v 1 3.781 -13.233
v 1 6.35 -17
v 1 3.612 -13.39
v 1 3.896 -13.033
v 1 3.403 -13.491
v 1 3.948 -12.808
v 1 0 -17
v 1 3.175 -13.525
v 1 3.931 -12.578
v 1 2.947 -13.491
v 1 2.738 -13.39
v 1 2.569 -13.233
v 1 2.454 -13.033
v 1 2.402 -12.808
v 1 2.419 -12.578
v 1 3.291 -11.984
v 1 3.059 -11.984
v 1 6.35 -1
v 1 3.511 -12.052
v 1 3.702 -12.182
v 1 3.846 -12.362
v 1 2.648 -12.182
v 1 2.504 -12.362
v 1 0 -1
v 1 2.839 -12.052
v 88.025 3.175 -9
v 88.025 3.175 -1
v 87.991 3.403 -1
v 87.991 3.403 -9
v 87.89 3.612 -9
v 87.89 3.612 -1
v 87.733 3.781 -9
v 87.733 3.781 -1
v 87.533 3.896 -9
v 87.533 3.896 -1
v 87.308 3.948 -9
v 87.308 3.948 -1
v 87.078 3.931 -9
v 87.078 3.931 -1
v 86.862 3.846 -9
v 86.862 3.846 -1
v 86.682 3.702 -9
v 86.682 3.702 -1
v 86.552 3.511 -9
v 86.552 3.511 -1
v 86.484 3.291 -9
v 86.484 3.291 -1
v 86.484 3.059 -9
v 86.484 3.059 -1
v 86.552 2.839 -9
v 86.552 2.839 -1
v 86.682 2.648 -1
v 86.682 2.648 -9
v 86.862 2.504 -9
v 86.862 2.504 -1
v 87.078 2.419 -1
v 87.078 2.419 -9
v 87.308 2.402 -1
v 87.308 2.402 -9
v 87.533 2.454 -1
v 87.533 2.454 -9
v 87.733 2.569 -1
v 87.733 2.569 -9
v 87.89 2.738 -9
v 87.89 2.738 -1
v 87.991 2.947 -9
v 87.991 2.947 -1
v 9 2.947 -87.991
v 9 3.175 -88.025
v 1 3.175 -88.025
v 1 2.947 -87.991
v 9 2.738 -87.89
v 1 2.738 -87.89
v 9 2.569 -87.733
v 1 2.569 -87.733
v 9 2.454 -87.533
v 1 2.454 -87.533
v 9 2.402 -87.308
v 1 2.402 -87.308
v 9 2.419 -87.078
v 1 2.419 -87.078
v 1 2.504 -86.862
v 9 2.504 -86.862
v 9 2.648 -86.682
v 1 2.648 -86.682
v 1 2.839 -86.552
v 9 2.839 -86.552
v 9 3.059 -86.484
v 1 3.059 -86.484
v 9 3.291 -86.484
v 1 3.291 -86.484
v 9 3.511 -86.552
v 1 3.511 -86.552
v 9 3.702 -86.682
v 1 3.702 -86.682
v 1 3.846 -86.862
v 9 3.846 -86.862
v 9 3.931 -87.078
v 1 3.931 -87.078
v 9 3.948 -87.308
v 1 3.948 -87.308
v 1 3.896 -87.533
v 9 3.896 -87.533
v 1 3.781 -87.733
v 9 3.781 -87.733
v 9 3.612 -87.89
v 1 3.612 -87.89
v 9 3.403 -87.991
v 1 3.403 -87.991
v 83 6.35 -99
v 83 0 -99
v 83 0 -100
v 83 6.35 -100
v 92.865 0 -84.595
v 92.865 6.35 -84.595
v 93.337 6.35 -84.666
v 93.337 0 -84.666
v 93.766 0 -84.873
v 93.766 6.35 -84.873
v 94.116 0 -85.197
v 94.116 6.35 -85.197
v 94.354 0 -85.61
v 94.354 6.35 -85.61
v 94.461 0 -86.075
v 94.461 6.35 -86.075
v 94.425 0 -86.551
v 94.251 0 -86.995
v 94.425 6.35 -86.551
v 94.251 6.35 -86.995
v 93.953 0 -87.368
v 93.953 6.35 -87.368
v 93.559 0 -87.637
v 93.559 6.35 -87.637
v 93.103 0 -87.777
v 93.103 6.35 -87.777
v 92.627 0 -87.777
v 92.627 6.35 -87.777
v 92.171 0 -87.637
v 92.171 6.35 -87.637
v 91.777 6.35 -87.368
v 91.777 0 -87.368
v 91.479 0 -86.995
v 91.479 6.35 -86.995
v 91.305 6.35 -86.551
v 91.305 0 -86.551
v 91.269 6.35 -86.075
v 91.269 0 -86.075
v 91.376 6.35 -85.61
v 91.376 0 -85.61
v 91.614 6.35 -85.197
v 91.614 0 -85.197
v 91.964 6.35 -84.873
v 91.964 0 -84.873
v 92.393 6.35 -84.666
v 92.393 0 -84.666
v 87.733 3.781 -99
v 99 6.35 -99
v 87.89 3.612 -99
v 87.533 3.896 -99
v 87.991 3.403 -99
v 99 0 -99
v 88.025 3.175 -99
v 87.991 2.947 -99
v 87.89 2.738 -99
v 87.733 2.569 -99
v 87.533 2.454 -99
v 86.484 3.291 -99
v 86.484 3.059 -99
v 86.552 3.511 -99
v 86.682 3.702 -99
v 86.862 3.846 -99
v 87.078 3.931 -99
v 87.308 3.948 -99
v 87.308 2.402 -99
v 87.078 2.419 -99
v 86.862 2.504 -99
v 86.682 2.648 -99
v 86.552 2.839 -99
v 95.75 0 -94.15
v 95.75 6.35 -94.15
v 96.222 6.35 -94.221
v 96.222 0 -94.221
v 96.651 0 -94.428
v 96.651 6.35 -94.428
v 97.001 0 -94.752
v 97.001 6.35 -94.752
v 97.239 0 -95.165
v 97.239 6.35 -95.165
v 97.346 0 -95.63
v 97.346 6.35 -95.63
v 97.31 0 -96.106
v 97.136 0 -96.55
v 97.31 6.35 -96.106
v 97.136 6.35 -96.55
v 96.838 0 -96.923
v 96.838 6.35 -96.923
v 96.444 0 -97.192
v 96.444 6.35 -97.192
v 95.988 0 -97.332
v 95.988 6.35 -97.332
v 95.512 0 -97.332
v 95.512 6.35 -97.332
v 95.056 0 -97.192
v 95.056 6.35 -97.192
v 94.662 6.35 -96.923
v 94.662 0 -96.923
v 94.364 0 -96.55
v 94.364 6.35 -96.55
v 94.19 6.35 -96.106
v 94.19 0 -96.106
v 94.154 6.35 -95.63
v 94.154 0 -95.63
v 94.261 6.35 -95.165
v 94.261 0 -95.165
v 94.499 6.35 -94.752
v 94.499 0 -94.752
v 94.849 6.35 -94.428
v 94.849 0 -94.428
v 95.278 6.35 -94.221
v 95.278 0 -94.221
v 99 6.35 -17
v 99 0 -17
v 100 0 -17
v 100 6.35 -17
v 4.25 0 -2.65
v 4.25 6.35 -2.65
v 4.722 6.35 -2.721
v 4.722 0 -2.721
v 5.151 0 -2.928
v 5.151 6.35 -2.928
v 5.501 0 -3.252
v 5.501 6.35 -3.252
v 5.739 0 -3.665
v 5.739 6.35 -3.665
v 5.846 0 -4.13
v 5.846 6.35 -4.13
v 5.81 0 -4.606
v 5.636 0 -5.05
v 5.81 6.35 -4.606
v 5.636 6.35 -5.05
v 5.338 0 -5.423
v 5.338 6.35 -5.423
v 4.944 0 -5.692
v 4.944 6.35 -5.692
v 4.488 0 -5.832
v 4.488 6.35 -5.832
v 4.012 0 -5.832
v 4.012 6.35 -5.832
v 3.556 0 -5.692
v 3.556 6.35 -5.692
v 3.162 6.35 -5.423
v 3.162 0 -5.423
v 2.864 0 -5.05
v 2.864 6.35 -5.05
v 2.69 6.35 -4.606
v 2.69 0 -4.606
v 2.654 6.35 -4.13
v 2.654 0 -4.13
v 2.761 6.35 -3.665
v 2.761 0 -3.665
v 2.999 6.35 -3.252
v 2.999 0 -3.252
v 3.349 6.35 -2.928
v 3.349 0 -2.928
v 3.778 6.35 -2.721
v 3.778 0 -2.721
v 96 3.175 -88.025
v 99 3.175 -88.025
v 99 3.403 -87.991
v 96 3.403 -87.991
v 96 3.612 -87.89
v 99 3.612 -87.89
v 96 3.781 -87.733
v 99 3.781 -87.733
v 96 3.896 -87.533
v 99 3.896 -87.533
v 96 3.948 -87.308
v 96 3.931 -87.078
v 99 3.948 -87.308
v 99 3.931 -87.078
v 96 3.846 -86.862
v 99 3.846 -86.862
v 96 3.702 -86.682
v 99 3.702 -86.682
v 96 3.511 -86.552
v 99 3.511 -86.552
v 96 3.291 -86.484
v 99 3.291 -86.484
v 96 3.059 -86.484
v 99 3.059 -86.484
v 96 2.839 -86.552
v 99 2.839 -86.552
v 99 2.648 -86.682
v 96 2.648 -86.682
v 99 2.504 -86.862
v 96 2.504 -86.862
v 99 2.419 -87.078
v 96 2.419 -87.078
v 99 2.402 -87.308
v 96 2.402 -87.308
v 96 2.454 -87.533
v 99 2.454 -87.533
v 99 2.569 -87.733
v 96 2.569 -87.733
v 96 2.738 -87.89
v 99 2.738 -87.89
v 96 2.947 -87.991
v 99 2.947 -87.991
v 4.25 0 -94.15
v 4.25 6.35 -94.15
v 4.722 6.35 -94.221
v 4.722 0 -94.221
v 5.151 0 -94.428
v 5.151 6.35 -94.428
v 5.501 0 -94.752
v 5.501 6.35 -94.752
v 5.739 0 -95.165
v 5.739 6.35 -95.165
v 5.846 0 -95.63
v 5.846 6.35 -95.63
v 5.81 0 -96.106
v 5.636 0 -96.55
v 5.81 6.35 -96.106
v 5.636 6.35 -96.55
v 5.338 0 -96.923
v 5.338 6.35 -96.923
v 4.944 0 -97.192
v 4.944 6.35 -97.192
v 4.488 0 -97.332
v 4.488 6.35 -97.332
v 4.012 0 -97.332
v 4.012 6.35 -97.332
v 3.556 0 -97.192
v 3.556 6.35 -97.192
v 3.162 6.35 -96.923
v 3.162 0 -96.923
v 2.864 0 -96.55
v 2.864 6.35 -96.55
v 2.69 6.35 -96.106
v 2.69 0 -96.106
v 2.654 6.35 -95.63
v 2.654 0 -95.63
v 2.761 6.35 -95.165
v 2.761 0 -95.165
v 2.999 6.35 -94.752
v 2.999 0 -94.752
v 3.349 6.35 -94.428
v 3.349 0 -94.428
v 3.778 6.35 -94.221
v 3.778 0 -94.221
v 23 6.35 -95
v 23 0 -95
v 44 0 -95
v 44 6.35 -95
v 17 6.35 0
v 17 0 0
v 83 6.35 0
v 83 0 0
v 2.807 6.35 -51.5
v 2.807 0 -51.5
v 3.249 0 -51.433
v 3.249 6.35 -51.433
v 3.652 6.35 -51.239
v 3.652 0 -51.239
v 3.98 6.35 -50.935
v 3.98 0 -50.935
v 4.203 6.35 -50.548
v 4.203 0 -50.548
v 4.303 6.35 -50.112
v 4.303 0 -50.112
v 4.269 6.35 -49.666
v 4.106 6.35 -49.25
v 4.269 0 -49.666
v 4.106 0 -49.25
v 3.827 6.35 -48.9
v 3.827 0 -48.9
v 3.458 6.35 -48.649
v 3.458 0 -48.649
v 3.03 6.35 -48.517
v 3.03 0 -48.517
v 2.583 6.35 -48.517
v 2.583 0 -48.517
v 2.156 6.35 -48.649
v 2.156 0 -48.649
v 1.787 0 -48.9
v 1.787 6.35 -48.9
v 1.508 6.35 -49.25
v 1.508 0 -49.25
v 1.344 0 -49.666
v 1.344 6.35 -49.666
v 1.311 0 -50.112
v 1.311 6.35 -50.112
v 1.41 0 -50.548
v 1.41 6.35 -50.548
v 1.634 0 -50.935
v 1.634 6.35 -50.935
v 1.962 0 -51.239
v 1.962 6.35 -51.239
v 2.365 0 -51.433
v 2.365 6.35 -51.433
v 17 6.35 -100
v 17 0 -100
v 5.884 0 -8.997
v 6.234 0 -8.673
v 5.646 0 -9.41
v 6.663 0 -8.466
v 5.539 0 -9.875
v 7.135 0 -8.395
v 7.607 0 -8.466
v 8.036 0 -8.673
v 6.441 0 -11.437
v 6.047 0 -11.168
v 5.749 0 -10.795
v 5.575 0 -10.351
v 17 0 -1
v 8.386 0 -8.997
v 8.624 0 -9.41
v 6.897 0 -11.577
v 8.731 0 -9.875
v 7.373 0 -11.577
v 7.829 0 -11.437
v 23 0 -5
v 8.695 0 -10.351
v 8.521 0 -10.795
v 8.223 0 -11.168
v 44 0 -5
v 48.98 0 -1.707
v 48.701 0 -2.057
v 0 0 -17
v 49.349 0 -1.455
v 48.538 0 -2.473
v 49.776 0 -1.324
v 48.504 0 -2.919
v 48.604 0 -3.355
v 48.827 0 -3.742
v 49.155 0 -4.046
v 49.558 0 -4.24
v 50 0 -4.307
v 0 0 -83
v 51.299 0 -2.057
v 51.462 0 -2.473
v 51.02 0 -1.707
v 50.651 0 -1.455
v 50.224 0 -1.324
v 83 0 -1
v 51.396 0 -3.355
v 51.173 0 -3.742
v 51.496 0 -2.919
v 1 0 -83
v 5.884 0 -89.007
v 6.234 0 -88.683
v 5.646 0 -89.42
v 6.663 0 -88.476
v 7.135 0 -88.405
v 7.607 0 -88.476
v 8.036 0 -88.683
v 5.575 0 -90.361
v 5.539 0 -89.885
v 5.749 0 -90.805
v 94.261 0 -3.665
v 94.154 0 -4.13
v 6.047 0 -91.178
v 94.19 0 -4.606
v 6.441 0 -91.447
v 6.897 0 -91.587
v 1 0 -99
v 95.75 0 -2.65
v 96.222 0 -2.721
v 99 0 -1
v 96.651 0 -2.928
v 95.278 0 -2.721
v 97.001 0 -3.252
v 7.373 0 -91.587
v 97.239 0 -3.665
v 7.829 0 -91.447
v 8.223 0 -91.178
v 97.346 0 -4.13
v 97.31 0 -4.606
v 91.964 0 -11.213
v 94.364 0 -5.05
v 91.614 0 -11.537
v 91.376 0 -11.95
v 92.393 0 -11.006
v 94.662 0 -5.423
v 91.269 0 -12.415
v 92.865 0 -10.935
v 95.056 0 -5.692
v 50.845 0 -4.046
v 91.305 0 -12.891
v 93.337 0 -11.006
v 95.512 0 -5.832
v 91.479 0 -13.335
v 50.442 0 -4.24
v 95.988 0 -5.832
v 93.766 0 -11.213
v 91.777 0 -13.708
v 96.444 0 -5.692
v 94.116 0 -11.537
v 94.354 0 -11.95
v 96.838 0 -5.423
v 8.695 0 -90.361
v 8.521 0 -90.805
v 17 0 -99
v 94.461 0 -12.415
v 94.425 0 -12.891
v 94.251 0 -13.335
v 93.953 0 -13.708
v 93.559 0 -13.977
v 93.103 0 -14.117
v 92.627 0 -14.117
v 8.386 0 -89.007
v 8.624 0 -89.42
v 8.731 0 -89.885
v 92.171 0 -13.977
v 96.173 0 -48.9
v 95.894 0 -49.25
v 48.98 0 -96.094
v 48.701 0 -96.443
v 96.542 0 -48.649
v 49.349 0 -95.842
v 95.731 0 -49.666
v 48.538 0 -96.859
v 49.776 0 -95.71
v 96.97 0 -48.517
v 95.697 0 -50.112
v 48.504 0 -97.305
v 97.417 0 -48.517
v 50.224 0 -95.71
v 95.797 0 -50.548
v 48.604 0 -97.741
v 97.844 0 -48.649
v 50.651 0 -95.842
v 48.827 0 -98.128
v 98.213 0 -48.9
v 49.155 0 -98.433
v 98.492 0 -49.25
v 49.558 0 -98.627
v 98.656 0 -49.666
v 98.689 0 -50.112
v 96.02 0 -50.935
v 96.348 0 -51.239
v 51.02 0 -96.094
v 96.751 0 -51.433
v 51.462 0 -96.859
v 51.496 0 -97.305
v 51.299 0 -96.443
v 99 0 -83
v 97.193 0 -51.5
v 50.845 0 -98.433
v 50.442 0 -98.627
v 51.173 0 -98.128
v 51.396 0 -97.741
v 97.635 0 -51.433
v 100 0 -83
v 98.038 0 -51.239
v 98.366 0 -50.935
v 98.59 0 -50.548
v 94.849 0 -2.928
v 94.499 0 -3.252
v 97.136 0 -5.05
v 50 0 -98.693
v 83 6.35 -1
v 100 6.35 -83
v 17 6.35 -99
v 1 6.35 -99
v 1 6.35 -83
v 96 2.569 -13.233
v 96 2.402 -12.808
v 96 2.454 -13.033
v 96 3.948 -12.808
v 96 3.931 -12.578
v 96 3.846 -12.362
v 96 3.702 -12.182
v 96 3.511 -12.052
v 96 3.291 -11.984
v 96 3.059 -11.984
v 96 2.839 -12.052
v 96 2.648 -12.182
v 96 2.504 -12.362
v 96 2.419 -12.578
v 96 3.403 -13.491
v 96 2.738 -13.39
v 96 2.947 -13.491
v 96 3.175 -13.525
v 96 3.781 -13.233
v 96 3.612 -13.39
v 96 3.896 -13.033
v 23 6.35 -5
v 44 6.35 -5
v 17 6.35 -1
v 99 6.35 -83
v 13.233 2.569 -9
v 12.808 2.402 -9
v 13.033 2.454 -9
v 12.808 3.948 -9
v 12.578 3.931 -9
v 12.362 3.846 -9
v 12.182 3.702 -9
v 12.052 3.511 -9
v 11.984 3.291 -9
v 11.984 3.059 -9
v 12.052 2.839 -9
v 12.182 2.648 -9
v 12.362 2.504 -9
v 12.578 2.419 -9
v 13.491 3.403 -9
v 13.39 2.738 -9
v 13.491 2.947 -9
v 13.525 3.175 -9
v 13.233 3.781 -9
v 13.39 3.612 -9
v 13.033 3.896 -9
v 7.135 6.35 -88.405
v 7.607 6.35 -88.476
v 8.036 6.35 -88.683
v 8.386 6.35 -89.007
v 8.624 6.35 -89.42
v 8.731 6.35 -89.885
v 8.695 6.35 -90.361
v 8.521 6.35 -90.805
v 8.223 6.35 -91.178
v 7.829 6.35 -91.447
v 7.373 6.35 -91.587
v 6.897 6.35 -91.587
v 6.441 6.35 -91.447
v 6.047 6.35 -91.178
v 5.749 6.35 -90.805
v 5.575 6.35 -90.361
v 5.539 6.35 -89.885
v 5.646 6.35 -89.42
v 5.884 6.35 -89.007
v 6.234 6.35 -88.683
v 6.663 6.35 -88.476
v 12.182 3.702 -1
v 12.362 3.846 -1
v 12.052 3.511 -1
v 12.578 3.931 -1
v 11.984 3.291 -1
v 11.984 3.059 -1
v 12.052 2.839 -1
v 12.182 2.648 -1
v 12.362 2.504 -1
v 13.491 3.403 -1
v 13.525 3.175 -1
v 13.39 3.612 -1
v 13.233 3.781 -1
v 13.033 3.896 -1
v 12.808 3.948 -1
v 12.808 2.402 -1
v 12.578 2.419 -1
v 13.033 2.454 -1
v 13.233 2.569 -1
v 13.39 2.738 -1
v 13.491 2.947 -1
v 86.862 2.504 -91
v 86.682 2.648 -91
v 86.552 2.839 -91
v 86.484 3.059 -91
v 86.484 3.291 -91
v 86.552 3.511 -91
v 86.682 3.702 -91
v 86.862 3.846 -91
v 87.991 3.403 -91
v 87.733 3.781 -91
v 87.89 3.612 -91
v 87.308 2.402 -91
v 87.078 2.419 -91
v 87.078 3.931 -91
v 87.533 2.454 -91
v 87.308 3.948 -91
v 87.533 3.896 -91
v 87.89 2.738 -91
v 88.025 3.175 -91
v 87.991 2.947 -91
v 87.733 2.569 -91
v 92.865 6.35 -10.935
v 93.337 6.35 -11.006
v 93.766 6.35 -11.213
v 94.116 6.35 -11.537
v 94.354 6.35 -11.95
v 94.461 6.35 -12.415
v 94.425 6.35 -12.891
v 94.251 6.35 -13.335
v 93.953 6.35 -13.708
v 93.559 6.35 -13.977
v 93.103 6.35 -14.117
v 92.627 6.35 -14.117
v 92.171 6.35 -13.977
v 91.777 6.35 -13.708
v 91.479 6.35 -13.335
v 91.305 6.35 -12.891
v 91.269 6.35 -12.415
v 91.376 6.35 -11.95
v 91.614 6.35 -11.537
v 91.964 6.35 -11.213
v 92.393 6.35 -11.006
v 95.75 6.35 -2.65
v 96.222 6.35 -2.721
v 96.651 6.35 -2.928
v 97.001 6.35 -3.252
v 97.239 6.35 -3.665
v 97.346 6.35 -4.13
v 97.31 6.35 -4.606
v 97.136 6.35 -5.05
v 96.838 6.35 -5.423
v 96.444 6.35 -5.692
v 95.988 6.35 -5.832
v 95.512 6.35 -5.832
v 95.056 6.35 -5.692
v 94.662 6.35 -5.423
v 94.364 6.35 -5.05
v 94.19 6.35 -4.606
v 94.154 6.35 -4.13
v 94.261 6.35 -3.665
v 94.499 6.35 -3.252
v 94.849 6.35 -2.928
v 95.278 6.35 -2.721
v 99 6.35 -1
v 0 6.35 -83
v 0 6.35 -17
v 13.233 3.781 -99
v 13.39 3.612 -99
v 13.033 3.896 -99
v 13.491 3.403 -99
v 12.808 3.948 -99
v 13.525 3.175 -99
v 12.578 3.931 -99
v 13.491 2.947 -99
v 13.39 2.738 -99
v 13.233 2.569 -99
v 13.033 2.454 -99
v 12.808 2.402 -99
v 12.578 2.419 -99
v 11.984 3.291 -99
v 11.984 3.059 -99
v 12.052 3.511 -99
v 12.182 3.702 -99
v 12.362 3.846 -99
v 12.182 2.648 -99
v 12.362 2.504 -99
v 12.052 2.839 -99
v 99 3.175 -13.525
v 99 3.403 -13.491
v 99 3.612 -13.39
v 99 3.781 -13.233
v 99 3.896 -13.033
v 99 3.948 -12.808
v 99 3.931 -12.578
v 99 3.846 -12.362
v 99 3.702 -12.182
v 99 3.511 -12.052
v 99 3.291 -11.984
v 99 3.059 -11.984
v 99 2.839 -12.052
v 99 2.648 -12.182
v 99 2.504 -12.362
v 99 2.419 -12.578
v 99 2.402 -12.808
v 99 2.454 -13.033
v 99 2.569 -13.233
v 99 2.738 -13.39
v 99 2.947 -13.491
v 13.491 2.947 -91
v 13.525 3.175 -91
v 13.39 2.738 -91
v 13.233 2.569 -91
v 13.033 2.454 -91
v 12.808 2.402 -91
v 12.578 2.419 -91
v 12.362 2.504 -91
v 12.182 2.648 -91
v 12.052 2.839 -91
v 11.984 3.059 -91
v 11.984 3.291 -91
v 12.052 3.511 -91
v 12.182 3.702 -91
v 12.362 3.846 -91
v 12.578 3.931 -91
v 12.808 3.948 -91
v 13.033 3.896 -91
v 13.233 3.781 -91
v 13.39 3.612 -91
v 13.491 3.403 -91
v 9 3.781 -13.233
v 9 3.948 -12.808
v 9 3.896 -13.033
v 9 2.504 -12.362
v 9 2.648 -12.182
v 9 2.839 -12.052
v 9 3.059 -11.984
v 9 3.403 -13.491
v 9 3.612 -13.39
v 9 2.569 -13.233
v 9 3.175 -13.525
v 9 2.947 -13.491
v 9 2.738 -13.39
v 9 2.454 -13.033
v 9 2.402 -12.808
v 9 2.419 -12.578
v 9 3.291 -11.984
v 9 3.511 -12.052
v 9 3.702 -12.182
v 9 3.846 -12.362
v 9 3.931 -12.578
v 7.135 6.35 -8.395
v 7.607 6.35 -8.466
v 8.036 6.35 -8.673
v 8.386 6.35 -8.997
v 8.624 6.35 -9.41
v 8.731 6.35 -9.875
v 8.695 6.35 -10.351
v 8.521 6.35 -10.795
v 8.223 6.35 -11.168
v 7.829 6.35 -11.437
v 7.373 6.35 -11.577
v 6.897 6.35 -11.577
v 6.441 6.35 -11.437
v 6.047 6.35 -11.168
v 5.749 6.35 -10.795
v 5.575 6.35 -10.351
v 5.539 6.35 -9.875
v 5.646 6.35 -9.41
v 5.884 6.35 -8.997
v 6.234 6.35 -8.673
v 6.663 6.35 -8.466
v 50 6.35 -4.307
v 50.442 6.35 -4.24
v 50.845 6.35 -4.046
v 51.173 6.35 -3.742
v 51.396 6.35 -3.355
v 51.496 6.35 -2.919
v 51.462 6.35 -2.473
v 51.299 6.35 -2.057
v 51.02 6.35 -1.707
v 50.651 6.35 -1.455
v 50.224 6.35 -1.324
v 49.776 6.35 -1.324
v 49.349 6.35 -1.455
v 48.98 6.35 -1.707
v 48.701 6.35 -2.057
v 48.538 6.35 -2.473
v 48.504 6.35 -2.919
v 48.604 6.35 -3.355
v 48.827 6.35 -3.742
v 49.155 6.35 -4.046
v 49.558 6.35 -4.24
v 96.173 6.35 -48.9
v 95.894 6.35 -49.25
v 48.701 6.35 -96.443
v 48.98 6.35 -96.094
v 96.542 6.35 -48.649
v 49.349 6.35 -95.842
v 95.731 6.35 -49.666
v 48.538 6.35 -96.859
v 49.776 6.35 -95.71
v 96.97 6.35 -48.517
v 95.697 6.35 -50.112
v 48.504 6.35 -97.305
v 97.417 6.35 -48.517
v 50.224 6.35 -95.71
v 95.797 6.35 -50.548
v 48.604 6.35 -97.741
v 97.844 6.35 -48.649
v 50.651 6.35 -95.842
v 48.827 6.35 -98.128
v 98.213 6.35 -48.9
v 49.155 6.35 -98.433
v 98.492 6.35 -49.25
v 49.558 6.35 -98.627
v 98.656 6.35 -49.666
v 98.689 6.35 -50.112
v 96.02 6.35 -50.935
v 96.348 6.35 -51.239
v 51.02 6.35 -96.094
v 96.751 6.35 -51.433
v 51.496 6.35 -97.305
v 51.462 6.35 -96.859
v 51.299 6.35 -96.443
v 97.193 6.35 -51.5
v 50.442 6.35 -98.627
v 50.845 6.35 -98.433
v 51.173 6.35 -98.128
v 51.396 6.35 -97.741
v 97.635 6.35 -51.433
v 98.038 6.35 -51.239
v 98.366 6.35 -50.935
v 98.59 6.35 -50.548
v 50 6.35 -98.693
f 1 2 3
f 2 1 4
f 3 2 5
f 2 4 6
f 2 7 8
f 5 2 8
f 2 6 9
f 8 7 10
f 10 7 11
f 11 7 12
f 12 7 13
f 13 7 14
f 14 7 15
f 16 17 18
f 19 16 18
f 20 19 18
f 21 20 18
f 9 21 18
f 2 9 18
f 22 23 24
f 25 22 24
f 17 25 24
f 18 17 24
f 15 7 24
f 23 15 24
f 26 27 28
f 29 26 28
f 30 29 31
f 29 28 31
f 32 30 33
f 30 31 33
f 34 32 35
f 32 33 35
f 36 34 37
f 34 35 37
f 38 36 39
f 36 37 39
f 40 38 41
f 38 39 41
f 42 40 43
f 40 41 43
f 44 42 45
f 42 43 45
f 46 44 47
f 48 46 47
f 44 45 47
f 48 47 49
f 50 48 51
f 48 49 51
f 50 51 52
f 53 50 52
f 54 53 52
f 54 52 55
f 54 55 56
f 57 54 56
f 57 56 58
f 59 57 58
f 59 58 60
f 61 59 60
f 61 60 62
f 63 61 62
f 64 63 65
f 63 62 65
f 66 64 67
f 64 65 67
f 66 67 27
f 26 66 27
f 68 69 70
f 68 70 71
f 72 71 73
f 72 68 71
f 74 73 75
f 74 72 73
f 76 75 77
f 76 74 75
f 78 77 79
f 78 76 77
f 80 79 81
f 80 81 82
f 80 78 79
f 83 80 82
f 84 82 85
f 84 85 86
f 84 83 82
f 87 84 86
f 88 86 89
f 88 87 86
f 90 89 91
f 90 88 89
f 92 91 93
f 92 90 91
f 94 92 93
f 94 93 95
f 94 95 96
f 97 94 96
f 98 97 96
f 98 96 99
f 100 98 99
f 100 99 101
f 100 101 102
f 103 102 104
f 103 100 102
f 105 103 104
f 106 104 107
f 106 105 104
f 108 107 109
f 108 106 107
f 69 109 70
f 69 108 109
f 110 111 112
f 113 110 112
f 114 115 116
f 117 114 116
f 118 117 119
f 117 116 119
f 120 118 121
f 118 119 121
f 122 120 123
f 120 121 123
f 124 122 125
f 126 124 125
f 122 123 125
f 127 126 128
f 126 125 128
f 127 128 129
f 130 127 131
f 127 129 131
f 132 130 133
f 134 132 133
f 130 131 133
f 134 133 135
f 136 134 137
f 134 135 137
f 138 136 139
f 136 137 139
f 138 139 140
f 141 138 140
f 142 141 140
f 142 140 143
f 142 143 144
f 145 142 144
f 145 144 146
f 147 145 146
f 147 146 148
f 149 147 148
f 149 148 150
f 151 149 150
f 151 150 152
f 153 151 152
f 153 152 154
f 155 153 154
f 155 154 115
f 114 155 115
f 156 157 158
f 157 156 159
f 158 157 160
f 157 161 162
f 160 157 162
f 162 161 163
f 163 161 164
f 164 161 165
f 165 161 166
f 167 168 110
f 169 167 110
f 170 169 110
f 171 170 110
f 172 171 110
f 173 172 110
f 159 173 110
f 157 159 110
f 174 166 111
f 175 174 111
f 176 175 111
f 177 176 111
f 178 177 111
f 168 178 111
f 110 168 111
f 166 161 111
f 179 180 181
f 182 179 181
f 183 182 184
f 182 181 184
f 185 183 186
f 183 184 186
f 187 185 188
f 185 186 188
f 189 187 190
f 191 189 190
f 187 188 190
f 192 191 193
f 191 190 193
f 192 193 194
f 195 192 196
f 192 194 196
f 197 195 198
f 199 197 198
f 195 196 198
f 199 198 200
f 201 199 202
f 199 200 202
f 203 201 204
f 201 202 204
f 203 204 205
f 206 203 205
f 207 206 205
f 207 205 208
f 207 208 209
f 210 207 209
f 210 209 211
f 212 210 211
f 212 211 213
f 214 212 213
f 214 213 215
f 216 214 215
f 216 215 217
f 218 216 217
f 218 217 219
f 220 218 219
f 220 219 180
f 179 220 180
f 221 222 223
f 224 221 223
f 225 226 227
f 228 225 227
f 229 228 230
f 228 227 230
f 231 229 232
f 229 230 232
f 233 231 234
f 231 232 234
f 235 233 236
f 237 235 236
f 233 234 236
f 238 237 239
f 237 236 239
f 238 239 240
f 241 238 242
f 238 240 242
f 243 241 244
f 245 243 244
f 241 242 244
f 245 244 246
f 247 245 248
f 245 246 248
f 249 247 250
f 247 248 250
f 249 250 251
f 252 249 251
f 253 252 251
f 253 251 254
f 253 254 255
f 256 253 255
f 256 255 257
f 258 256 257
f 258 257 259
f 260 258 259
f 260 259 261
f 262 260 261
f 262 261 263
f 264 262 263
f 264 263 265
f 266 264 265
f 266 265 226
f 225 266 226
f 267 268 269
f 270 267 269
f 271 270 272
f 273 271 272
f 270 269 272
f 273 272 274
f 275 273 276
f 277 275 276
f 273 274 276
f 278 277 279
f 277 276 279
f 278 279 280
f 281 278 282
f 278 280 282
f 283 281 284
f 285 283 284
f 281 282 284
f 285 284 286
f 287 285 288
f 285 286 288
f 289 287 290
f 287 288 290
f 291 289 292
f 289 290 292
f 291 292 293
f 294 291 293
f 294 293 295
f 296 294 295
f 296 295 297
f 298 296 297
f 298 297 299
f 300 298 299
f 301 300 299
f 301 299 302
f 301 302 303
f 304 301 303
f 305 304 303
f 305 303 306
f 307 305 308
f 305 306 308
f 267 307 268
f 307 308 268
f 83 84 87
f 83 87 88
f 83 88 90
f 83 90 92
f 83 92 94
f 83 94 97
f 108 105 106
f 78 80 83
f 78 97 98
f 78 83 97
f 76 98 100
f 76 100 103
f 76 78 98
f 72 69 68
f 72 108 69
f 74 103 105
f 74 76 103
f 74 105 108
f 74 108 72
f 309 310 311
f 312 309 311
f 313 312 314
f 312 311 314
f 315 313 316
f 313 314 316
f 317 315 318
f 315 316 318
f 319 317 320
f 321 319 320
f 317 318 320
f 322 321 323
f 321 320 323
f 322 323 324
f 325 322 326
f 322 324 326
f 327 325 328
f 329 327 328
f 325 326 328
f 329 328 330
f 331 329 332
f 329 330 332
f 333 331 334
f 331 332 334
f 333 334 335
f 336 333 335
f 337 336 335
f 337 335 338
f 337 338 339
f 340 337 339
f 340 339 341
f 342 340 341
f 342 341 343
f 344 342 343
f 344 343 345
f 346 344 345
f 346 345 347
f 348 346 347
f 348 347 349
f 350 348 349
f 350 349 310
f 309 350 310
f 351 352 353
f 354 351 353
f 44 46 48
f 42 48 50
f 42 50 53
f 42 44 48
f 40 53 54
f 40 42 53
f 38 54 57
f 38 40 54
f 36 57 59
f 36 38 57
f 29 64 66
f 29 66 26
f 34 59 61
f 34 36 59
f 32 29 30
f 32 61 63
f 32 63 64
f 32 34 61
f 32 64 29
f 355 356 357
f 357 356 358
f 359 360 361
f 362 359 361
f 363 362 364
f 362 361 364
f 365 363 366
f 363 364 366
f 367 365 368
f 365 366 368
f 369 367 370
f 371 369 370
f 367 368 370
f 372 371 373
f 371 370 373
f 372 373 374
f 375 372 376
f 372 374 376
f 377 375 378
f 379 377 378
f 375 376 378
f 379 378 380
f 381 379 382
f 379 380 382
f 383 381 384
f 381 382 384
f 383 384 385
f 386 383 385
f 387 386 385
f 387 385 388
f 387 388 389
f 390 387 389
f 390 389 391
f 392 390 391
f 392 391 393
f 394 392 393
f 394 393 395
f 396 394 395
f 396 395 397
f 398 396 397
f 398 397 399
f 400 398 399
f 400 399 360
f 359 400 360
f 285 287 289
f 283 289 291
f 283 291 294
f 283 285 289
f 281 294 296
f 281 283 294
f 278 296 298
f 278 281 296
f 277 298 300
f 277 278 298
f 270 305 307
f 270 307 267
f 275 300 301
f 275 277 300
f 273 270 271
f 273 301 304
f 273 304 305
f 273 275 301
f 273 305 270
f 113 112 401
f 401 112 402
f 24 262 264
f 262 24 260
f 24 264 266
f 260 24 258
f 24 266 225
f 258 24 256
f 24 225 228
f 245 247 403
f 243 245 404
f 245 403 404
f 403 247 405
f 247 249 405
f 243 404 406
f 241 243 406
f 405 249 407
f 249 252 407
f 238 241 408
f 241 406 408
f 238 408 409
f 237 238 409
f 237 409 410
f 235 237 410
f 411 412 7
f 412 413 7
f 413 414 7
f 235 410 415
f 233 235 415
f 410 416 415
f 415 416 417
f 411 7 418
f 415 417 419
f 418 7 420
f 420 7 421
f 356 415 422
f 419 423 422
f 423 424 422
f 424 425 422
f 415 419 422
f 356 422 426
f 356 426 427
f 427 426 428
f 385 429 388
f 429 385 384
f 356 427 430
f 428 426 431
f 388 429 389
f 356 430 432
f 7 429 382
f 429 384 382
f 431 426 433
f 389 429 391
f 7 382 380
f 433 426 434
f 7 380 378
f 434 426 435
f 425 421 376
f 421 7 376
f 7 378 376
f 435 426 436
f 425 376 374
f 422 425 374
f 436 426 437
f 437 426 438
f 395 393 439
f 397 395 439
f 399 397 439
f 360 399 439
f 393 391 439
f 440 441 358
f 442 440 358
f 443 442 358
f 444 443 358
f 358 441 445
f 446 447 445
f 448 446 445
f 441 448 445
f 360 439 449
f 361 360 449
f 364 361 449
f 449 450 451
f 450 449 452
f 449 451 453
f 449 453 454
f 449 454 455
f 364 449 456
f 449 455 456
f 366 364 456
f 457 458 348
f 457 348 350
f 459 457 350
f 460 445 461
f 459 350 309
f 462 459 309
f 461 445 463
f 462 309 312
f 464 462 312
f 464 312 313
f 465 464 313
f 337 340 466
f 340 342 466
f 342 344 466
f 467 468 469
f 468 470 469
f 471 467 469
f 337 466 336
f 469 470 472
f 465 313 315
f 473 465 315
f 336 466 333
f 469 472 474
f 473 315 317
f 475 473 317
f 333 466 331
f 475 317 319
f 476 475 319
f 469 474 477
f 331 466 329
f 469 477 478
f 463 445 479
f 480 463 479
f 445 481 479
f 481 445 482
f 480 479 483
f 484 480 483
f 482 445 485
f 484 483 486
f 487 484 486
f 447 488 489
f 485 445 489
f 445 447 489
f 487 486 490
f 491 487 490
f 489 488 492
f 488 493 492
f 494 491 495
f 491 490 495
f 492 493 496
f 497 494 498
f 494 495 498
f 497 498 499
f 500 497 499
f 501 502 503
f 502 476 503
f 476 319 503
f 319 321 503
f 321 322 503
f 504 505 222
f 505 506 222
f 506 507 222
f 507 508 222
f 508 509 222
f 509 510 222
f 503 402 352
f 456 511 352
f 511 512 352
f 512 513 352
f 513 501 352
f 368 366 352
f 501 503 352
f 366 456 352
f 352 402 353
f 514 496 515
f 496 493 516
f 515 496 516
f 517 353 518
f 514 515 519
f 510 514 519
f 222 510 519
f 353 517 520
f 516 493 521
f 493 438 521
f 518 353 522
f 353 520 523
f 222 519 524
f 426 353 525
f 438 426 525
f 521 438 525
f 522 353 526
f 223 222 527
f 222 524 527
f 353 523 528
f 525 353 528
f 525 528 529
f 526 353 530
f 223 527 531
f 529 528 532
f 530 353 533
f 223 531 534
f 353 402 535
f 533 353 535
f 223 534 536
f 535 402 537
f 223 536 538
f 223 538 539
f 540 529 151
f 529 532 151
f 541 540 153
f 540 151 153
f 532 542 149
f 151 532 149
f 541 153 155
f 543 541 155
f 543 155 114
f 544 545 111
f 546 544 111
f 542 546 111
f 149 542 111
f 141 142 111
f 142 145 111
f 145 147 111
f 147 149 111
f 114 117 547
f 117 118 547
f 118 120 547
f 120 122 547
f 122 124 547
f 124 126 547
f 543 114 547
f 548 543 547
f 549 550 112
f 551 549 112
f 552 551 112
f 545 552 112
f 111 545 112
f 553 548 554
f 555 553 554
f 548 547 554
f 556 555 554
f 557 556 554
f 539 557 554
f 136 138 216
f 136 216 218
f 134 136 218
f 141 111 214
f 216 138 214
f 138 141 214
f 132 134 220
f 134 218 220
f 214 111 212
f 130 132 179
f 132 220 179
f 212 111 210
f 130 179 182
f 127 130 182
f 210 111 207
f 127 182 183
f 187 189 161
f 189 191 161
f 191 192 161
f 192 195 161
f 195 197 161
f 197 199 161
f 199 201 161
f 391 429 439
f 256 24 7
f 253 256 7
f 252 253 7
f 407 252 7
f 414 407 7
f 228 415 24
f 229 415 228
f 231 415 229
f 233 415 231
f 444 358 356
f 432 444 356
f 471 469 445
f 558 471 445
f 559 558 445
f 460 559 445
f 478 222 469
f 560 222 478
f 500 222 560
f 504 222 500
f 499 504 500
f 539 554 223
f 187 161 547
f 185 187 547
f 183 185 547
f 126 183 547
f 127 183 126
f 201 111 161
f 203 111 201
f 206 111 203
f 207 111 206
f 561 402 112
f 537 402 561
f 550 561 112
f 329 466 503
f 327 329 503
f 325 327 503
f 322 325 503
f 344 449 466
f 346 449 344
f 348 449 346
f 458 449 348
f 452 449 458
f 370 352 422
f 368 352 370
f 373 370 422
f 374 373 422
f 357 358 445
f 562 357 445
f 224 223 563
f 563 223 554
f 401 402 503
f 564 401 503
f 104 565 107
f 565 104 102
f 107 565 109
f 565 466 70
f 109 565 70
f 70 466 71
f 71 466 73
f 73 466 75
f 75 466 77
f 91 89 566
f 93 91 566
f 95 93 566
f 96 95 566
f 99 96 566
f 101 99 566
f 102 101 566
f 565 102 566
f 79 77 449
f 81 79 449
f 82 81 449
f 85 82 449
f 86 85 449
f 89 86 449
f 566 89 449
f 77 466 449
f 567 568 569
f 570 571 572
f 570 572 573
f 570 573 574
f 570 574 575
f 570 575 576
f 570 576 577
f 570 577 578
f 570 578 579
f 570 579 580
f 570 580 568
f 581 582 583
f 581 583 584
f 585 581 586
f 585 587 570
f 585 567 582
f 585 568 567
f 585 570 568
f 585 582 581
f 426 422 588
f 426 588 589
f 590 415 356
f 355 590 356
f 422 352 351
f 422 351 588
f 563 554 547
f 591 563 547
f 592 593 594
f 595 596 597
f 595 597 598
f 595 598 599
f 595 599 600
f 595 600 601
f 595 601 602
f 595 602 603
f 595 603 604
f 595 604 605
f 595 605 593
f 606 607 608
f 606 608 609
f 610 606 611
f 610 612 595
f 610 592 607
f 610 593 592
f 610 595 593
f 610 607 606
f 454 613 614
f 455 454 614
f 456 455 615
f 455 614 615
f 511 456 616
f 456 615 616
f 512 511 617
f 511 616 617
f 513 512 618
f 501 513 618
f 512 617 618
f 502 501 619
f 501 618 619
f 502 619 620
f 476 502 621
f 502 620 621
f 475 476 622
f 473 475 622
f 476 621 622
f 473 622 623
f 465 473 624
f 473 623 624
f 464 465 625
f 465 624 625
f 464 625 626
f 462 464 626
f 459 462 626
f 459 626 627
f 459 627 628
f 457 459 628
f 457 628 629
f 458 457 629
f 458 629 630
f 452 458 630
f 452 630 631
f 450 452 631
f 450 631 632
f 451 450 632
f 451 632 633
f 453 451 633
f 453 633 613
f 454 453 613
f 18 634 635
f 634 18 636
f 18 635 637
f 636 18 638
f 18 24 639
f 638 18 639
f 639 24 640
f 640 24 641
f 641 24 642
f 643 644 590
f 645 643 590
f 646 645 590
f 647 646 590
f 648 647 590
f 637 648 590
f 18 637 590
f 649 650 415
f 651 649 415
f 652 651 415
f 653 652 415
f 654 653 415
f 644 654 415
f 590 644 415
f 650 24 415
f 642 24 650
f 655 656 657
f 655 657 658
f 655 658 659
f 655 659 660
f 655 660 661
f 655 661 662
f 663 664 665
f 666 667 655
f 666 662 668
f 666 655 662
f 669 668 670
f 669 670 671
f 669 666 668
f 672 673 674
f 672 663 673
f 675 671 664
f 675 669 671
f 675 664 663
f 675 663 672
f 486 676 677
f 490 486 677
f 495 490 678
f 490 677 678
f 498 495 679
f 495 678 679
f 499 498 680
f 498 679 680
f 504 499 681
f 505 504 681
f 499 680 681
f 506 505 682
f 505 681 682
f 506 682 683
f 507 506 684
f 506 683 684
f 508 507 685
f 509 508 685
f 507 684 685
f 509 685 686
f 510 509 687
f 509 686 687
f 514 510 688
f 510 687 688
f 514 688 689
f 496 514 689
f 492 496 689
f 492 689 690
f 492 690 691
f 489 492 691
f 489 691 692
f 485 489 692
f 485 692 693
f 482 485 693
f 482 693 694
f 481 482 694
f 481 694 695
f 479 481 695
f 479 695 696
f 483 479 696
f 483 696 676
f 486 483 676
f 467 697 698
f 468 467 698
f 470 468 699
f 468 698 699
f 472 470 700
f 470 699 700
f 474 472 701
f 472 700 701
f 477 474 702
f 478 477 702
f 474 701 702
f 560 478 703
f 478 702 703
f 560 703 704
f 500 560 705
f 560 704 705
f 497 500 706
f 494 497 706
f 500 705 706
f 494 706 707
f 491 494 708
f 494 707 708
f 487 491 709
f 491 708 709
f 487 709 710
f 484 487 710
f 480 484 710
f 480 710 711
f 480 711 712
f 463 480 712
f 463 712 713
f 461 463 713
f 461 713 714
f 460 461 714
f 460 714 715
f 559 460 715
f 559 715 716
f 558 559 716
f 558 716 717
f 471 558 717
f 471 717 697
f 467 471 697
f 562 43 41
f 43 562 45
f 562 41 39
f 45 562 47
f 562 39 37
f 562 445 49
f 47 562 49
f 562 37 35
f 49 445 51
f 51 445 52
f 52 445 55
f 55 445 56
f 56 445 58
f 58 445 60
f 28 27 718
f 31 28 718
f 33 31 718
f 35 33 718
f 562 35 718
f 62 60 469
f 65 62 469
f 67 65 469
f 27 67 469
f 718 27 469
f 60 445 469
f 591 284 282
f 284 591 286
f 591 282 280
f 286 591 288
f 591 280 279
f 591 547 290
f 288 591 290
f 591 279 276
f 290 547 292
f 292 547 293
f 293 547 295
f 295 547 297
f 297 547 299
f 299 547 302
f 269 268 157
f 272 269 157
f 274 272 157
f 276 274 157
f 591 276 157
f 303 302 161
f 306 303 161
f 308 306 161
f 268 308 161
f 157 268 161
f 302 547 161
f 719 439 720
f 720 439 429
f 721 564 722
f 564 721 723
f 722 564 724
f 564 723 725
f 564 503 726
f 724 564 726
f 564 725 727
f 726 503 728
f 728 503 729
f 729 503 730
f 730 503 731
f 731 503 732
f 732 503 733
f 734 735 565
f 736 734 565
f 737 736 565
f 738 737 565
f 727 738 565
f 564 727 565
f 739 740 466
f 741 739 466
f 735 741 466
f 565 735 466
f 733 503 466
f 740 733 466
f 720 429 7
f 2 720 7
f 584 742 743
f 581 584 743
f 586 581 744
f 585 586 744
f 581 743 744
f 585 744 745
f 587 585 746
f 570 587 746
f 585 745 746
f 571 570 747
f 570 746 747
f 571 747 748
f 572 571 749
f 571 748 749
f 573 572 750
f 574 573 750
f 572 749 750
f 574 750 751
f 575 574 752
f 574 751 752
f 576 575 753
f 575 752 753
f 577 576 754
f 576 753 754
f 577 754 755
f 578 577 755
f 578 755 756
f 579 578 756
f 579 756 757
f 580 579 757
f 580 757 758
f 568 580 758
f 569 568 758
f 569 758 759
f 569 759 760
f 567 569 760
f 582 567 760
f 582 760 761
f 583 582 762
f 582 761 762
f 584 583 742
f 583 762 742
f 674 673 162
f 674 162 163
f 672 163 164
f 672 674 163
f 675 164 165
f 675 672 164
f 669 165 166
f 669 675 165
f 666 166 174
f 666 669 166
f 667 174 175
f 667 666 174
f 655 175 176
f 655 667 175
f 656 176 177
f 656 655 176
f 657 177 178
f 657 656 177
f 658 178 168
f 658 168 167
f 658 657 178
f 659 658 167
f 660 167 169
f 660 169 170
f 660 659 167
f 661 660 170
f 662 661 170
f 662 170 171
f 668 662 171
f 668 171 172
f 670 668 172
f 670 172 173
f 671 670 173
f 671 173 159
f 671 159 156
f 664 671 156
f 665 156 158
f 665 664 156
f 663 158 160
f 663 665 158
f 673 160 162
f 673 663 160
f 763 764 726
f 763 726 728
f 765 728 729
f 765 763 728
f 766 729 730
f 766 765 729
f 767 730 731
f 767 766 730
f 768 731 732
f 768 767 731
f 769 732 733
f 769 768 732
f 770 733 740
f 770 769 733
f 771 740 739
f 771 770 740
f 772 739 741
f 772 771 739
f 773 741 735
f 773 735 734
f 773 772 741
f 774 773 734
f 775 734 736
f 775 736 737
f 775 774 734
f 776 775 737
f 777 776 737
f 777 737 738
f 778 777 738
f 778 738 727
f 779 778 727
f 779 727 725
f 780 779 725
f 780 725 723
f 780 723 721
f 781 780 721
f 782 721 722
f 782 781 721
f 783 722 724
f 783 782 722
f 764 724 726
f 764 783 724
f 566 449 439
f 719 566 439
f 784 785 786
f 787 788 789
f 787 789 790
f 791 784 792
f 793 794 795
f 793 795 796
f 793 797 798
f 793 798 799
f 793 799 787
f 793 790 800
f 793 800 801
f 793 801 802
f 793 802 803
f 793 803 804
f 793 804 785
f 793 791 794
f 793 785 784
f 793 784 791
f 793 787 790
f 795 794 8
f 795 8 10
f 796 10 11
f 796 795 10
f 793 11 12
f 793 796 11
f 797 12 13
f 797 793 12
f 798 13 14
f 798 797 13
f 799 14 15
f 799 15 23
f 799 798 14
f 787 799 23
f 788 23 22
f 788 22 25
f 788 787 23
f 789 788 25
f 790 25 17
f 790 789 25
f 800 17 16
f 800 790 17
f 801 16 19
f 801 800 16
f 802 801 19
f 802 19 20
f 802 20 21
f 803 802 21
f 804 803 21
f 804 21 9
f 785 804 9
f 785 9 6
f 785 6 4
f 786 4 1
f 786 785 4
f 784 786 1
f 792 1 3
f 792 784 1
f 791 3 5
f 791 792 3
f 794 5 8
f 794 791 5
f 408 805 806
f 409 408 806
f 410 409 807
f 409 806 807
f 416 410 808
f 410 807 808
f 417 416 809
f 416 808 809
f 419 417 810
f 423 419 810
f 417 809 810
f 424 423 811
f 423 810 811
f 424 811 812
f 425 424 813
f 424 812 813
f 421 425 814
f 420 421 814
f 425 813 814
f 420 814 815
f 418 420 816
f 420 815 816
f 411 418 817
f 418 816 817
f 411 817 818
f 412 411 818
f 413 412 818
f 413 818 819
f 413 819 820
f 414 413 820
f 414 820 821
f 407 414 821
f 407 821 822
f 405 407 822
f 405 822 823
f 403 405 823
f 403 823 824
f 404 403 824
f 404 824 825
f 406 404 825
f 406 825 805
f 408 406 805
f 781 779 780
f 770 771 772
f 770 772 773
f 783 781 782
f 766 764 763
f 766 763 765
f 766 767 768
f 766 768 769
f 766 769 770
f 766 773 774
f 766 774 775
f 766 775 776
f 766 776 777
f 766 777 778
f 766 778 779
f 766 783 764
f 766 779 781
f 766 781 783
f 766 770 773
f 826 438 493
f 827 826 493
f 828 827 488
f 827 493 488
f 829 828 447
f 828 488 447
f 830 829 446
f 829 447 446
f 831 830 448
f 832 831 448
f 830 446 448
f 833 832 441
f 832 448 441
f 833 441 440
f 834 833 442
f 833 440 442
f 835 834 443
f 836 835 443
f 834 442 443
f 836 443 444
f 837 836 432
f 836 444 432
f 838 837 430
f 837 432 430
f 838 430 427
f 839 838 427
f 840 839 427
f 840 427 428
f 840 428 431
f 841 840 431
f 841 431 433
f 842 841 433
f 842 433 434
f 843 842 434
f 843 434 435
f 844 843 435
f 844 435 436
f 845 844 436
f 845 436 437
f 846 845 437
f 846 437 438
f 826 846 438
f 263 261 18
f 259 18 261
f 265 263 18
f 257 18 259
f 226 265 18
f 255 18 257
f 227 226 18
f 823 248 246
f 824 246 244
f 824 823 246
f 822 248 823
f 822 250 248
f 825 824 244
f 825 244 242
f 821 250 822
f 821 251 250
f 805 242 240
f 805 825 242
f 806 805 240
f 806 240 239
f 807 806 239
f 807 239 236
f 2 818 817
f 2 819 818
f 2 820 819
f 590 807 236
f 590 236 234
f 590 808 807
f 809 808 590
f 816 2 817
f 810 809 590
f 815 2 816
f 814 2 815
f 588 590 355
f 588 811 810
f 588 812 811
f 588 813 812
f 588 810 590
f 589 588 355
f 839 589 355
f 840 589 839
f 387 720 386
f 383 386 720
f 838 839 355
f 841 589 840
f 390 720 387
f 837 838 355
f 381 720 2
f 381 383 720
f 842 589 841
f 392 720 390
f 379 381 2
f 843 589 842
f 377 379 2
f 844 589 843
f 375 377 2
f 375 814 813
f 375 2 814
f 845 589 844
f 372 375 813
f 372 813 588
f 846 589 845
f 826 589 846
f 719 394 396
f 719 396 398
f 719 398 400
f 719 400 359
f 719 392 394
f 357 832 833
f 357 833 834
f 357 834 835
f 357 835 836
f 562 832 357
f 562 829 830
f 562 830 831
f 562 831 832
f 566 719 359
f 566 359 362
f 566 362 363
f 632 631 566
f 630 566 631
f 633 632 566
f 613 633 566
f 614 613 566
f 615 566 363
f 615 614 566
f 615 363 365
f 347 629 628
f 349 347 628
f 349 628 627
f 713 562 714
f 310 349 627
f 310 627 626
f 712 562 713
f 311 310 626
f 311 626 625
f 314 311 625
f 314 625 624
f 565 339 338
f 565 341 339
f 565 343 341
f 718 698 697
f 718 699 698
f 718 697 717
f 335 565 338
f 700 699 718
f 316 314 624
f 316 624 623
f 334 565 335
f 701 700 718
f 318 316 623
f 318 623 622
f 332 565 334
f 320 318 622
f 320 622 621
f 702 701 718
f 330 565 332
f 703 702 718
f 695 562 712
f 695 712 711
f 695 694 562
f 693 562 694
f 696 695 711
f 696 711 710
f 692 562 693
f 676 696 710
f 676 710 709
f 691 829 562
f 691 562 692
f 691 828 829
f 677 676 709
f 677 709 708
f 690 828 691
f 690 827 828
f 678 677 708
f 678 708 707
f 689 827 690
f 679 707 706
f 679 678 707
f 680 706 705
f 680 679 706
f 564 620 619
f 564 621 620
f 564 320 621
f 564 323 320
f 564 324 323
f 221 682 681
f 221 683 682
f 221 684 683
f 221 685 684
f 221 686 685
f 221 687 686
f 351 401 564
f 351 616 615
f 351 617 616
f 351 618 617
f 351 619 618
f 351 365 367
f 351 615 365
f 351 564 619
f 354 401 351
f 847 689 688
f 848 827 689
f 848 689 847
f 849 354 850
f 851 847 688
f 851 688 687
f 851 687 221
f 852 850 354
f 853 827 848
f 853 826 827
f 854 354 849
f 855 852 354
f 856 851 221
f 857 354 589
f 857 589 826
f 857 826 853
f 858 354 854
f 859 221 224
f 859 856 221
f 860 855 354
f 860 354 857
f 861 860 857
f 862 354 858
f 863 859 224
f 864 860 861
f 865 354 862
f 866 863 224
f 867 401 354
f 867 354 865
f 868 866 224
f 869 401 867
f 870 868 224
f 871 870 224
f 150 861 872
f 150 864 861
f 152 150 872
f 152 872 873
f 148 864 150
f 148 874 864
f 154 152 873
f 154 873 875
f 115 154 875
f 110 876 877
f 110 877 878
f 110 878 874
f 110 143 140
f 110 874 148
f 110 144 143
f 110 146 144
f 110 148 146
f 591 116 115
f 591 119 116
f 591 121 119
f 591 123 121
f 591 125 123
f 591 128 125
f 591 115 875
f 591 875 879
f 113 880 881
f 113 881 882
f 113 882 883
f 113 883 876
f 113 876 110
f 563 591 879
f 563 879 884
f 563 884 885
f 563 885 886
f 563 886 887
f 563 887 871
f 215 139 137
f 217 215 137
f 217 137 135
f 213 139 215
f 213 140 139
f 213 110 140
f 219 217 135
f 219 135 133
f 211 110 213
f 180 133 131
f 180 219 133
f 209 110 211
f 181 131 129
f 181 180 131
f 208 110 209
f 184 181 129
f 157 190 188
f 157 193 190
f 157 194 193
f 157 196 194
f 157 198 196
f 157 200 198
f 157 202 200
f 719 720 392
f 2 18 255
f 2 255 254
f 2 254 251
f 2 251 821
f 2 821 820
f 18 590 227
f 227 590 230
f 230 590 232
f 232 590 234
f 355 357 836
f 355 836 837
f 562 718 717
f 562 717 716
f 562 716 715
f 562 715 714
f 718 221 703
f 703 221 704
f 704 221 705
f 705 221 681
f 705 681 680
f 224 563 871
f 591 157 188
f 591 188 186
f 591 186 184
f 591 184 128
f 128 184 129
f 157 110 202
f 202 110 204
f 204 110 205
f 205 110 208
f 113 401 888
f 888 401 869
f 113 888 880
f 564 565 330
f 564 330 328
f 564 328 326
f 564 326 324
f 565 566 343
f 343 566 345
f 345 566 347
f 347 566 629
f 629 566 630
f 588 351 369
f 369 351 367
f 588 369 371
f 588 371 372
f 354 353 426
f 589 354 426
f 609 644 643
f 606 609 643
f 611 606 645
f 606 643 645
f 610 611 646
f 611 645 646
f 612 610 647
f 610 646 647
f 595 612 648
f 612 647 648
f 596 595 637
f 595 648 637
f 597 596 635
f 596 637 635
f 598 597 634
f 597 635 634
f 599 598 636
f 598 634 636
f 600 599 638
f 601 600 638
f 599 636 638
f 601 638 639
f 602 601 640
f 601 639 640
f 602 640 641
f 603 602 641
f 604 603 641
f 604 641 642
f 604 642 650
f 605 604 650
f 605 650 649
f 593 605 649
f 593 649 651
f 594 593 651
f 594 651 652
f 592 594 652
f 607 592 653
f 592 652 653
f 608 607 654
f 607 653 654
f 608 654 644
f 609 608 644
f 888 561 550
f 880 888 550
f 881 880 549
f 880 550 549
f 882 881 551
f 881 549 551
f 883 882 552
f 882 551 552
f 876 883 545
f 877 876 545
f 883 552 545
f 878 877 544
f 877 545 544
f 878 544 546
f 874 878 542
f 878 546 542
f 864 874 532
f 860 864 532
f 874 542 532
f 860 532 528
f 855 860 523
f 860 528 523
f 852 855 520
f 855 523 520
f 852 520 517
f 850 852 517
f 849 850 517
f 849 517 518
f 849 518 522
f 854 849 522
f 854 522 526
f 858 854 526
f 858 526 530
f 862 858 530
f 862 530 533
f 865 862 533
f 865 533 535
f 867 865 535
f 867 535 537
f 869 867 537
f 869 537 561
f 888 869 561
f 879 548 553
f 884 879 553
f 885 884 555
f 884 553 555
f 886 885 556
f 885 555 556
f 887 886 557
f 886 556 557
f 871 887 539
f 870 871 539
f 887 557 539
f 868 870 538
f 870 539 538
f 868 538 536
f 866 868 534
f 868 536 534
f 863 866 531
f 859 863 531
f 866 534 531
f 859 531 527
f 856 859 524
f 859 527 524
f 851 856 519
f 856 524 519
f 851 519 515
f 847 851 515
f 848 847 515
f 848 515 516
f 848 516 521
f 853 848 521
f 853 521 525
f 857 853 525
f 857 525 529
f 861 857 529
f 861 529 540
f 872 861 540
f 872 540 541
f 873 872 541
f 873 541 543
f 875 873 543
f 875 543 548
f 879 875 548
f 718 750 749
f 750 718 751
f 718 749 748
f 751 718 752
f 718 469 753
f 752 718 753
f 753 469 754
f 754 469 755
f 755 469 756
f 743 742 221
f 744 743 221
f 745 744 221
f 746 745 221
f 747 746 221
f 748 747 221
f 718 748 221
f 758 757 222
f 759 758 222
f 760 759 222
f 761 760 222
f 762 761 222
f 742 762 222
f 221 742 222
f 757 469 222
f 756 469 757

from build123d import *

# Parameters (mm, degrees)
BOSS_EXTRUDE1_DEPTH = 6.35
SKETCH4_R           = 1.2
CUT_EXTRUDE3_DEPTH  = 2540
SKETCH129_R         = 0.775
CUT_EXTRUDE5_DEPTH  = 3
SKETCH130_R         = 0.775
CUT_EXTRUDE6_DEPTH  = 8
CUT_EXTRUDE7_START  = -8
SKETCH131_R         = 0.775
CUT_EXTRUDE7_DEPTH  = 8
CUT_EXTRUDE8_START  = -8
SKETCH132_R         = 0.775
CUT_EXTRUDE8_DEPTH  = 8
SKETCH133_R         = 1.6
CUT_EXTRUDE9_DEPTH  = 10
SKETCH134_R         = 1.6
CUT_EXTRUDE10_DEPTH = 10
SKETCH135_R         = 1.5
CUT_EXTRUDE11_DEPTH = 142.56384602
SKETCH136_W         = 21
SKETCH136_H         = 90
CUT_EXTRUDE12_DEPTH = 142.56384602


with BuildPart() as part:
    # Sketch1 → Boss-Extrude1 (new body)
    with BuildSketch(Plane(origin=(0, 0, 0), x_dir=(1, 0, 0), z_dir=(0, 1, 0))):
        Polygon((1, 83), (0, 83), (0, 17), (1, 17), (1, 1), (17, 1), (17, 0), (83, 0), (83, 1), (99, 1), (99, 17), (100, 17), (100, 83), (99, 83), (99, 99), (83, 99), (83, 100), (17, 100), (17, 99), (1, 99), align=None)
    extrude(amount=BOSS_EXTRUDE1_DEPTH)

    # Sketch4 → Cut-Extrude3 (cut, symmetric)
    with BuildSketch(Plane(origin=(-170.766523355, -217.05420542, -269.308617799), x_dir=(0, 0, -1), z_dir=(0, -1, 0))):
        with Locations((-179.303617798, 177.901523357)):
            Circle(SKETCH4_R)
        with Locations((-259.313617798, 177.901523357)):
            Circle(SKETCH4_R)
        with Locations((-256.773617797, 263.631523357)):
            Circle(SKETCH4_R)
        with Locations((-183.113617797, 263.631523357)):
            Circle(SKETCH4_R)
    extrude(amount=CUT_EXTRUDE3_DEPTH, both=True, mode=Mode.SUBTRACT)

    # Sketch129 → Cut-Extrude5 (cut)
    with BuildSketch(Plane(origin=(99, 0, 0), x_dir=(0, 0, -1), z_dir=(1, 0, 0))):
        with Locations((12.75, 3.175)):
            Circle(SKETCH129_R)
        with Locations((87.25, 3.175)):
            Circle(SKETCH129_R)
    extrude(amount=-CUT_EXTRUDE5_DEPTH, mode=Mode.SUBTRACT)

    # Sketch130 → Cut-Extrude6 (cut)
    with BuildSketch(Plane.XY.offset(-1)):
        with Locations((87.25, 3.175)):
            Circle(SKETCH130_R)
        with Locations((12.75, 3.175)):
            Circle(SKETCH130_R)
    extrude(amount=-CUT_EXTRUDE6_DEPTH, mode=Mode.SUBTRACT)

    # Sketch131 → Cut-Extrude7 (cut)
    with BuildSketch(Plane.ZY.offset(-1).offset(CUT_EXTRUDE7_START)):
        with Locations(Location((-12.75, 3.175, 0), (0, 0, 180))):
            Circle(SKETCH131_R)
        with Locations(Location((-87.25, 3.175, 0), (0, 0, 180))):
            Circle(SKETCH131_R)
    extrude(amount=CUT_EXTRUDE7_DEPTH, mode=Mode.SUBTRACT)

    # Sketch132 → Cut-Extrude8 (cut)
    with BuildSketch(Plane(origin=(0, 0, -99), x_dir=(-1, 0, 0), z_dir=(0, 0, -1)).offset(CUT_EXTRUDE8_START)):
        with Locations(Location((-87.25, 3.175, 0), (0, 0, 180))):
            Circle(SKETCH132_R)
        with Locations(Location((-12.75, 3.175, 0), (0, 0, 180))):
            Circle(SKETCH132_R)
    extrude(amount=CUT_EXTRUDE8_DEPTH, mode=Mode.SUBTRACT)

    # Sketch133 → Cut-Extrude9 (cut)
    with BuildSketch(Plane(origin=(0, 6.35, 0), x_dir=(1, 0, 0), z_dir=(0, 1, 0))):
        with Locations(Location((4.25, 95.75, 0), (0, 0, 270))):
            Circle(SKETCH133_R)
        with Locations(Location((4.25, 4.25, 0), (0, 0, 270))):
            Circle(SKETCH133_R)
        with Locations(Location((95.75, 95.75, 0), (0, 0, 270))):
            Circle(SKETCH133_R)
        with Locations(Location((95.75, 4.25, 0), (0, 0, 270))):
            Circle(SKETCH133_R)
    extrude(amount=-CUT_EXTRUDE9_DEPTH, mode=Mode.SUBTRACT)

    # Sketch134 → Cut-Extrude10 (cut)
    with BuildSketch(Plane(origin=(0, 6.35, 0), x_dir=(1, 0, 0), z_dir=(0, 1, 0))):
        with Locations(Location((92.865000001, 86.195000002, 0), (0, 0, 270))):
            Circle(SKETCH134_R)
        with Locations(Location((92.865000002, 12.535000002, 0), (0, 0, 270))):
            Circle(SKETCH134_R)
        with Locations(Location((7.135000002, 9.995000001, 0), (0, 0, 270))):
            Circle(SKETCH134_R)
        with Locations(Location((7.135000001, 90.005000001, 0), (0, 0, 270))):
            Circle(SKETCH134_R)
    extrude(amount=-CUT_EXTRUDE10_DEPTH, mode=Mode.SUBTRACT)

    # Sketch135 → Cut-Extrude11 (cut, through all)
    with BuildSketch(Plane.XZ):
        with Locations(Location((2.8068, -50, 0), (0, 0, 270))):
            Circle(SKETCH135_R)
        with Locations(Location((50, -2.8068, 0), (0, 0, 270))):
            Circle(SKETCH135_R)
        with Locations(Location((97.1932, -50, 0), (0, 0, 270))):
            Circle(SKETCH135_R)
        with Locations(Location((50, -97.1932, 0), (0, 0, 270))):
            Circle(SKETCH135_R)
    extrude(amount=-CUT_EXTRUDE11_DEPTH, mode=Mode.SUBTRACT)

    # Sketch136 → Cut-Extrude12 (cut, through all)
    with BuildSketch(Plane.XZ):
        with Locations((33.5, -50)):
            Rectangle(SKETCH136_W, SKETCH136_H)
    extrude(amount=-CUT_EXTRUDE12_DEPTH, mode=Mode.SUBTRACT)


solid = part.part
